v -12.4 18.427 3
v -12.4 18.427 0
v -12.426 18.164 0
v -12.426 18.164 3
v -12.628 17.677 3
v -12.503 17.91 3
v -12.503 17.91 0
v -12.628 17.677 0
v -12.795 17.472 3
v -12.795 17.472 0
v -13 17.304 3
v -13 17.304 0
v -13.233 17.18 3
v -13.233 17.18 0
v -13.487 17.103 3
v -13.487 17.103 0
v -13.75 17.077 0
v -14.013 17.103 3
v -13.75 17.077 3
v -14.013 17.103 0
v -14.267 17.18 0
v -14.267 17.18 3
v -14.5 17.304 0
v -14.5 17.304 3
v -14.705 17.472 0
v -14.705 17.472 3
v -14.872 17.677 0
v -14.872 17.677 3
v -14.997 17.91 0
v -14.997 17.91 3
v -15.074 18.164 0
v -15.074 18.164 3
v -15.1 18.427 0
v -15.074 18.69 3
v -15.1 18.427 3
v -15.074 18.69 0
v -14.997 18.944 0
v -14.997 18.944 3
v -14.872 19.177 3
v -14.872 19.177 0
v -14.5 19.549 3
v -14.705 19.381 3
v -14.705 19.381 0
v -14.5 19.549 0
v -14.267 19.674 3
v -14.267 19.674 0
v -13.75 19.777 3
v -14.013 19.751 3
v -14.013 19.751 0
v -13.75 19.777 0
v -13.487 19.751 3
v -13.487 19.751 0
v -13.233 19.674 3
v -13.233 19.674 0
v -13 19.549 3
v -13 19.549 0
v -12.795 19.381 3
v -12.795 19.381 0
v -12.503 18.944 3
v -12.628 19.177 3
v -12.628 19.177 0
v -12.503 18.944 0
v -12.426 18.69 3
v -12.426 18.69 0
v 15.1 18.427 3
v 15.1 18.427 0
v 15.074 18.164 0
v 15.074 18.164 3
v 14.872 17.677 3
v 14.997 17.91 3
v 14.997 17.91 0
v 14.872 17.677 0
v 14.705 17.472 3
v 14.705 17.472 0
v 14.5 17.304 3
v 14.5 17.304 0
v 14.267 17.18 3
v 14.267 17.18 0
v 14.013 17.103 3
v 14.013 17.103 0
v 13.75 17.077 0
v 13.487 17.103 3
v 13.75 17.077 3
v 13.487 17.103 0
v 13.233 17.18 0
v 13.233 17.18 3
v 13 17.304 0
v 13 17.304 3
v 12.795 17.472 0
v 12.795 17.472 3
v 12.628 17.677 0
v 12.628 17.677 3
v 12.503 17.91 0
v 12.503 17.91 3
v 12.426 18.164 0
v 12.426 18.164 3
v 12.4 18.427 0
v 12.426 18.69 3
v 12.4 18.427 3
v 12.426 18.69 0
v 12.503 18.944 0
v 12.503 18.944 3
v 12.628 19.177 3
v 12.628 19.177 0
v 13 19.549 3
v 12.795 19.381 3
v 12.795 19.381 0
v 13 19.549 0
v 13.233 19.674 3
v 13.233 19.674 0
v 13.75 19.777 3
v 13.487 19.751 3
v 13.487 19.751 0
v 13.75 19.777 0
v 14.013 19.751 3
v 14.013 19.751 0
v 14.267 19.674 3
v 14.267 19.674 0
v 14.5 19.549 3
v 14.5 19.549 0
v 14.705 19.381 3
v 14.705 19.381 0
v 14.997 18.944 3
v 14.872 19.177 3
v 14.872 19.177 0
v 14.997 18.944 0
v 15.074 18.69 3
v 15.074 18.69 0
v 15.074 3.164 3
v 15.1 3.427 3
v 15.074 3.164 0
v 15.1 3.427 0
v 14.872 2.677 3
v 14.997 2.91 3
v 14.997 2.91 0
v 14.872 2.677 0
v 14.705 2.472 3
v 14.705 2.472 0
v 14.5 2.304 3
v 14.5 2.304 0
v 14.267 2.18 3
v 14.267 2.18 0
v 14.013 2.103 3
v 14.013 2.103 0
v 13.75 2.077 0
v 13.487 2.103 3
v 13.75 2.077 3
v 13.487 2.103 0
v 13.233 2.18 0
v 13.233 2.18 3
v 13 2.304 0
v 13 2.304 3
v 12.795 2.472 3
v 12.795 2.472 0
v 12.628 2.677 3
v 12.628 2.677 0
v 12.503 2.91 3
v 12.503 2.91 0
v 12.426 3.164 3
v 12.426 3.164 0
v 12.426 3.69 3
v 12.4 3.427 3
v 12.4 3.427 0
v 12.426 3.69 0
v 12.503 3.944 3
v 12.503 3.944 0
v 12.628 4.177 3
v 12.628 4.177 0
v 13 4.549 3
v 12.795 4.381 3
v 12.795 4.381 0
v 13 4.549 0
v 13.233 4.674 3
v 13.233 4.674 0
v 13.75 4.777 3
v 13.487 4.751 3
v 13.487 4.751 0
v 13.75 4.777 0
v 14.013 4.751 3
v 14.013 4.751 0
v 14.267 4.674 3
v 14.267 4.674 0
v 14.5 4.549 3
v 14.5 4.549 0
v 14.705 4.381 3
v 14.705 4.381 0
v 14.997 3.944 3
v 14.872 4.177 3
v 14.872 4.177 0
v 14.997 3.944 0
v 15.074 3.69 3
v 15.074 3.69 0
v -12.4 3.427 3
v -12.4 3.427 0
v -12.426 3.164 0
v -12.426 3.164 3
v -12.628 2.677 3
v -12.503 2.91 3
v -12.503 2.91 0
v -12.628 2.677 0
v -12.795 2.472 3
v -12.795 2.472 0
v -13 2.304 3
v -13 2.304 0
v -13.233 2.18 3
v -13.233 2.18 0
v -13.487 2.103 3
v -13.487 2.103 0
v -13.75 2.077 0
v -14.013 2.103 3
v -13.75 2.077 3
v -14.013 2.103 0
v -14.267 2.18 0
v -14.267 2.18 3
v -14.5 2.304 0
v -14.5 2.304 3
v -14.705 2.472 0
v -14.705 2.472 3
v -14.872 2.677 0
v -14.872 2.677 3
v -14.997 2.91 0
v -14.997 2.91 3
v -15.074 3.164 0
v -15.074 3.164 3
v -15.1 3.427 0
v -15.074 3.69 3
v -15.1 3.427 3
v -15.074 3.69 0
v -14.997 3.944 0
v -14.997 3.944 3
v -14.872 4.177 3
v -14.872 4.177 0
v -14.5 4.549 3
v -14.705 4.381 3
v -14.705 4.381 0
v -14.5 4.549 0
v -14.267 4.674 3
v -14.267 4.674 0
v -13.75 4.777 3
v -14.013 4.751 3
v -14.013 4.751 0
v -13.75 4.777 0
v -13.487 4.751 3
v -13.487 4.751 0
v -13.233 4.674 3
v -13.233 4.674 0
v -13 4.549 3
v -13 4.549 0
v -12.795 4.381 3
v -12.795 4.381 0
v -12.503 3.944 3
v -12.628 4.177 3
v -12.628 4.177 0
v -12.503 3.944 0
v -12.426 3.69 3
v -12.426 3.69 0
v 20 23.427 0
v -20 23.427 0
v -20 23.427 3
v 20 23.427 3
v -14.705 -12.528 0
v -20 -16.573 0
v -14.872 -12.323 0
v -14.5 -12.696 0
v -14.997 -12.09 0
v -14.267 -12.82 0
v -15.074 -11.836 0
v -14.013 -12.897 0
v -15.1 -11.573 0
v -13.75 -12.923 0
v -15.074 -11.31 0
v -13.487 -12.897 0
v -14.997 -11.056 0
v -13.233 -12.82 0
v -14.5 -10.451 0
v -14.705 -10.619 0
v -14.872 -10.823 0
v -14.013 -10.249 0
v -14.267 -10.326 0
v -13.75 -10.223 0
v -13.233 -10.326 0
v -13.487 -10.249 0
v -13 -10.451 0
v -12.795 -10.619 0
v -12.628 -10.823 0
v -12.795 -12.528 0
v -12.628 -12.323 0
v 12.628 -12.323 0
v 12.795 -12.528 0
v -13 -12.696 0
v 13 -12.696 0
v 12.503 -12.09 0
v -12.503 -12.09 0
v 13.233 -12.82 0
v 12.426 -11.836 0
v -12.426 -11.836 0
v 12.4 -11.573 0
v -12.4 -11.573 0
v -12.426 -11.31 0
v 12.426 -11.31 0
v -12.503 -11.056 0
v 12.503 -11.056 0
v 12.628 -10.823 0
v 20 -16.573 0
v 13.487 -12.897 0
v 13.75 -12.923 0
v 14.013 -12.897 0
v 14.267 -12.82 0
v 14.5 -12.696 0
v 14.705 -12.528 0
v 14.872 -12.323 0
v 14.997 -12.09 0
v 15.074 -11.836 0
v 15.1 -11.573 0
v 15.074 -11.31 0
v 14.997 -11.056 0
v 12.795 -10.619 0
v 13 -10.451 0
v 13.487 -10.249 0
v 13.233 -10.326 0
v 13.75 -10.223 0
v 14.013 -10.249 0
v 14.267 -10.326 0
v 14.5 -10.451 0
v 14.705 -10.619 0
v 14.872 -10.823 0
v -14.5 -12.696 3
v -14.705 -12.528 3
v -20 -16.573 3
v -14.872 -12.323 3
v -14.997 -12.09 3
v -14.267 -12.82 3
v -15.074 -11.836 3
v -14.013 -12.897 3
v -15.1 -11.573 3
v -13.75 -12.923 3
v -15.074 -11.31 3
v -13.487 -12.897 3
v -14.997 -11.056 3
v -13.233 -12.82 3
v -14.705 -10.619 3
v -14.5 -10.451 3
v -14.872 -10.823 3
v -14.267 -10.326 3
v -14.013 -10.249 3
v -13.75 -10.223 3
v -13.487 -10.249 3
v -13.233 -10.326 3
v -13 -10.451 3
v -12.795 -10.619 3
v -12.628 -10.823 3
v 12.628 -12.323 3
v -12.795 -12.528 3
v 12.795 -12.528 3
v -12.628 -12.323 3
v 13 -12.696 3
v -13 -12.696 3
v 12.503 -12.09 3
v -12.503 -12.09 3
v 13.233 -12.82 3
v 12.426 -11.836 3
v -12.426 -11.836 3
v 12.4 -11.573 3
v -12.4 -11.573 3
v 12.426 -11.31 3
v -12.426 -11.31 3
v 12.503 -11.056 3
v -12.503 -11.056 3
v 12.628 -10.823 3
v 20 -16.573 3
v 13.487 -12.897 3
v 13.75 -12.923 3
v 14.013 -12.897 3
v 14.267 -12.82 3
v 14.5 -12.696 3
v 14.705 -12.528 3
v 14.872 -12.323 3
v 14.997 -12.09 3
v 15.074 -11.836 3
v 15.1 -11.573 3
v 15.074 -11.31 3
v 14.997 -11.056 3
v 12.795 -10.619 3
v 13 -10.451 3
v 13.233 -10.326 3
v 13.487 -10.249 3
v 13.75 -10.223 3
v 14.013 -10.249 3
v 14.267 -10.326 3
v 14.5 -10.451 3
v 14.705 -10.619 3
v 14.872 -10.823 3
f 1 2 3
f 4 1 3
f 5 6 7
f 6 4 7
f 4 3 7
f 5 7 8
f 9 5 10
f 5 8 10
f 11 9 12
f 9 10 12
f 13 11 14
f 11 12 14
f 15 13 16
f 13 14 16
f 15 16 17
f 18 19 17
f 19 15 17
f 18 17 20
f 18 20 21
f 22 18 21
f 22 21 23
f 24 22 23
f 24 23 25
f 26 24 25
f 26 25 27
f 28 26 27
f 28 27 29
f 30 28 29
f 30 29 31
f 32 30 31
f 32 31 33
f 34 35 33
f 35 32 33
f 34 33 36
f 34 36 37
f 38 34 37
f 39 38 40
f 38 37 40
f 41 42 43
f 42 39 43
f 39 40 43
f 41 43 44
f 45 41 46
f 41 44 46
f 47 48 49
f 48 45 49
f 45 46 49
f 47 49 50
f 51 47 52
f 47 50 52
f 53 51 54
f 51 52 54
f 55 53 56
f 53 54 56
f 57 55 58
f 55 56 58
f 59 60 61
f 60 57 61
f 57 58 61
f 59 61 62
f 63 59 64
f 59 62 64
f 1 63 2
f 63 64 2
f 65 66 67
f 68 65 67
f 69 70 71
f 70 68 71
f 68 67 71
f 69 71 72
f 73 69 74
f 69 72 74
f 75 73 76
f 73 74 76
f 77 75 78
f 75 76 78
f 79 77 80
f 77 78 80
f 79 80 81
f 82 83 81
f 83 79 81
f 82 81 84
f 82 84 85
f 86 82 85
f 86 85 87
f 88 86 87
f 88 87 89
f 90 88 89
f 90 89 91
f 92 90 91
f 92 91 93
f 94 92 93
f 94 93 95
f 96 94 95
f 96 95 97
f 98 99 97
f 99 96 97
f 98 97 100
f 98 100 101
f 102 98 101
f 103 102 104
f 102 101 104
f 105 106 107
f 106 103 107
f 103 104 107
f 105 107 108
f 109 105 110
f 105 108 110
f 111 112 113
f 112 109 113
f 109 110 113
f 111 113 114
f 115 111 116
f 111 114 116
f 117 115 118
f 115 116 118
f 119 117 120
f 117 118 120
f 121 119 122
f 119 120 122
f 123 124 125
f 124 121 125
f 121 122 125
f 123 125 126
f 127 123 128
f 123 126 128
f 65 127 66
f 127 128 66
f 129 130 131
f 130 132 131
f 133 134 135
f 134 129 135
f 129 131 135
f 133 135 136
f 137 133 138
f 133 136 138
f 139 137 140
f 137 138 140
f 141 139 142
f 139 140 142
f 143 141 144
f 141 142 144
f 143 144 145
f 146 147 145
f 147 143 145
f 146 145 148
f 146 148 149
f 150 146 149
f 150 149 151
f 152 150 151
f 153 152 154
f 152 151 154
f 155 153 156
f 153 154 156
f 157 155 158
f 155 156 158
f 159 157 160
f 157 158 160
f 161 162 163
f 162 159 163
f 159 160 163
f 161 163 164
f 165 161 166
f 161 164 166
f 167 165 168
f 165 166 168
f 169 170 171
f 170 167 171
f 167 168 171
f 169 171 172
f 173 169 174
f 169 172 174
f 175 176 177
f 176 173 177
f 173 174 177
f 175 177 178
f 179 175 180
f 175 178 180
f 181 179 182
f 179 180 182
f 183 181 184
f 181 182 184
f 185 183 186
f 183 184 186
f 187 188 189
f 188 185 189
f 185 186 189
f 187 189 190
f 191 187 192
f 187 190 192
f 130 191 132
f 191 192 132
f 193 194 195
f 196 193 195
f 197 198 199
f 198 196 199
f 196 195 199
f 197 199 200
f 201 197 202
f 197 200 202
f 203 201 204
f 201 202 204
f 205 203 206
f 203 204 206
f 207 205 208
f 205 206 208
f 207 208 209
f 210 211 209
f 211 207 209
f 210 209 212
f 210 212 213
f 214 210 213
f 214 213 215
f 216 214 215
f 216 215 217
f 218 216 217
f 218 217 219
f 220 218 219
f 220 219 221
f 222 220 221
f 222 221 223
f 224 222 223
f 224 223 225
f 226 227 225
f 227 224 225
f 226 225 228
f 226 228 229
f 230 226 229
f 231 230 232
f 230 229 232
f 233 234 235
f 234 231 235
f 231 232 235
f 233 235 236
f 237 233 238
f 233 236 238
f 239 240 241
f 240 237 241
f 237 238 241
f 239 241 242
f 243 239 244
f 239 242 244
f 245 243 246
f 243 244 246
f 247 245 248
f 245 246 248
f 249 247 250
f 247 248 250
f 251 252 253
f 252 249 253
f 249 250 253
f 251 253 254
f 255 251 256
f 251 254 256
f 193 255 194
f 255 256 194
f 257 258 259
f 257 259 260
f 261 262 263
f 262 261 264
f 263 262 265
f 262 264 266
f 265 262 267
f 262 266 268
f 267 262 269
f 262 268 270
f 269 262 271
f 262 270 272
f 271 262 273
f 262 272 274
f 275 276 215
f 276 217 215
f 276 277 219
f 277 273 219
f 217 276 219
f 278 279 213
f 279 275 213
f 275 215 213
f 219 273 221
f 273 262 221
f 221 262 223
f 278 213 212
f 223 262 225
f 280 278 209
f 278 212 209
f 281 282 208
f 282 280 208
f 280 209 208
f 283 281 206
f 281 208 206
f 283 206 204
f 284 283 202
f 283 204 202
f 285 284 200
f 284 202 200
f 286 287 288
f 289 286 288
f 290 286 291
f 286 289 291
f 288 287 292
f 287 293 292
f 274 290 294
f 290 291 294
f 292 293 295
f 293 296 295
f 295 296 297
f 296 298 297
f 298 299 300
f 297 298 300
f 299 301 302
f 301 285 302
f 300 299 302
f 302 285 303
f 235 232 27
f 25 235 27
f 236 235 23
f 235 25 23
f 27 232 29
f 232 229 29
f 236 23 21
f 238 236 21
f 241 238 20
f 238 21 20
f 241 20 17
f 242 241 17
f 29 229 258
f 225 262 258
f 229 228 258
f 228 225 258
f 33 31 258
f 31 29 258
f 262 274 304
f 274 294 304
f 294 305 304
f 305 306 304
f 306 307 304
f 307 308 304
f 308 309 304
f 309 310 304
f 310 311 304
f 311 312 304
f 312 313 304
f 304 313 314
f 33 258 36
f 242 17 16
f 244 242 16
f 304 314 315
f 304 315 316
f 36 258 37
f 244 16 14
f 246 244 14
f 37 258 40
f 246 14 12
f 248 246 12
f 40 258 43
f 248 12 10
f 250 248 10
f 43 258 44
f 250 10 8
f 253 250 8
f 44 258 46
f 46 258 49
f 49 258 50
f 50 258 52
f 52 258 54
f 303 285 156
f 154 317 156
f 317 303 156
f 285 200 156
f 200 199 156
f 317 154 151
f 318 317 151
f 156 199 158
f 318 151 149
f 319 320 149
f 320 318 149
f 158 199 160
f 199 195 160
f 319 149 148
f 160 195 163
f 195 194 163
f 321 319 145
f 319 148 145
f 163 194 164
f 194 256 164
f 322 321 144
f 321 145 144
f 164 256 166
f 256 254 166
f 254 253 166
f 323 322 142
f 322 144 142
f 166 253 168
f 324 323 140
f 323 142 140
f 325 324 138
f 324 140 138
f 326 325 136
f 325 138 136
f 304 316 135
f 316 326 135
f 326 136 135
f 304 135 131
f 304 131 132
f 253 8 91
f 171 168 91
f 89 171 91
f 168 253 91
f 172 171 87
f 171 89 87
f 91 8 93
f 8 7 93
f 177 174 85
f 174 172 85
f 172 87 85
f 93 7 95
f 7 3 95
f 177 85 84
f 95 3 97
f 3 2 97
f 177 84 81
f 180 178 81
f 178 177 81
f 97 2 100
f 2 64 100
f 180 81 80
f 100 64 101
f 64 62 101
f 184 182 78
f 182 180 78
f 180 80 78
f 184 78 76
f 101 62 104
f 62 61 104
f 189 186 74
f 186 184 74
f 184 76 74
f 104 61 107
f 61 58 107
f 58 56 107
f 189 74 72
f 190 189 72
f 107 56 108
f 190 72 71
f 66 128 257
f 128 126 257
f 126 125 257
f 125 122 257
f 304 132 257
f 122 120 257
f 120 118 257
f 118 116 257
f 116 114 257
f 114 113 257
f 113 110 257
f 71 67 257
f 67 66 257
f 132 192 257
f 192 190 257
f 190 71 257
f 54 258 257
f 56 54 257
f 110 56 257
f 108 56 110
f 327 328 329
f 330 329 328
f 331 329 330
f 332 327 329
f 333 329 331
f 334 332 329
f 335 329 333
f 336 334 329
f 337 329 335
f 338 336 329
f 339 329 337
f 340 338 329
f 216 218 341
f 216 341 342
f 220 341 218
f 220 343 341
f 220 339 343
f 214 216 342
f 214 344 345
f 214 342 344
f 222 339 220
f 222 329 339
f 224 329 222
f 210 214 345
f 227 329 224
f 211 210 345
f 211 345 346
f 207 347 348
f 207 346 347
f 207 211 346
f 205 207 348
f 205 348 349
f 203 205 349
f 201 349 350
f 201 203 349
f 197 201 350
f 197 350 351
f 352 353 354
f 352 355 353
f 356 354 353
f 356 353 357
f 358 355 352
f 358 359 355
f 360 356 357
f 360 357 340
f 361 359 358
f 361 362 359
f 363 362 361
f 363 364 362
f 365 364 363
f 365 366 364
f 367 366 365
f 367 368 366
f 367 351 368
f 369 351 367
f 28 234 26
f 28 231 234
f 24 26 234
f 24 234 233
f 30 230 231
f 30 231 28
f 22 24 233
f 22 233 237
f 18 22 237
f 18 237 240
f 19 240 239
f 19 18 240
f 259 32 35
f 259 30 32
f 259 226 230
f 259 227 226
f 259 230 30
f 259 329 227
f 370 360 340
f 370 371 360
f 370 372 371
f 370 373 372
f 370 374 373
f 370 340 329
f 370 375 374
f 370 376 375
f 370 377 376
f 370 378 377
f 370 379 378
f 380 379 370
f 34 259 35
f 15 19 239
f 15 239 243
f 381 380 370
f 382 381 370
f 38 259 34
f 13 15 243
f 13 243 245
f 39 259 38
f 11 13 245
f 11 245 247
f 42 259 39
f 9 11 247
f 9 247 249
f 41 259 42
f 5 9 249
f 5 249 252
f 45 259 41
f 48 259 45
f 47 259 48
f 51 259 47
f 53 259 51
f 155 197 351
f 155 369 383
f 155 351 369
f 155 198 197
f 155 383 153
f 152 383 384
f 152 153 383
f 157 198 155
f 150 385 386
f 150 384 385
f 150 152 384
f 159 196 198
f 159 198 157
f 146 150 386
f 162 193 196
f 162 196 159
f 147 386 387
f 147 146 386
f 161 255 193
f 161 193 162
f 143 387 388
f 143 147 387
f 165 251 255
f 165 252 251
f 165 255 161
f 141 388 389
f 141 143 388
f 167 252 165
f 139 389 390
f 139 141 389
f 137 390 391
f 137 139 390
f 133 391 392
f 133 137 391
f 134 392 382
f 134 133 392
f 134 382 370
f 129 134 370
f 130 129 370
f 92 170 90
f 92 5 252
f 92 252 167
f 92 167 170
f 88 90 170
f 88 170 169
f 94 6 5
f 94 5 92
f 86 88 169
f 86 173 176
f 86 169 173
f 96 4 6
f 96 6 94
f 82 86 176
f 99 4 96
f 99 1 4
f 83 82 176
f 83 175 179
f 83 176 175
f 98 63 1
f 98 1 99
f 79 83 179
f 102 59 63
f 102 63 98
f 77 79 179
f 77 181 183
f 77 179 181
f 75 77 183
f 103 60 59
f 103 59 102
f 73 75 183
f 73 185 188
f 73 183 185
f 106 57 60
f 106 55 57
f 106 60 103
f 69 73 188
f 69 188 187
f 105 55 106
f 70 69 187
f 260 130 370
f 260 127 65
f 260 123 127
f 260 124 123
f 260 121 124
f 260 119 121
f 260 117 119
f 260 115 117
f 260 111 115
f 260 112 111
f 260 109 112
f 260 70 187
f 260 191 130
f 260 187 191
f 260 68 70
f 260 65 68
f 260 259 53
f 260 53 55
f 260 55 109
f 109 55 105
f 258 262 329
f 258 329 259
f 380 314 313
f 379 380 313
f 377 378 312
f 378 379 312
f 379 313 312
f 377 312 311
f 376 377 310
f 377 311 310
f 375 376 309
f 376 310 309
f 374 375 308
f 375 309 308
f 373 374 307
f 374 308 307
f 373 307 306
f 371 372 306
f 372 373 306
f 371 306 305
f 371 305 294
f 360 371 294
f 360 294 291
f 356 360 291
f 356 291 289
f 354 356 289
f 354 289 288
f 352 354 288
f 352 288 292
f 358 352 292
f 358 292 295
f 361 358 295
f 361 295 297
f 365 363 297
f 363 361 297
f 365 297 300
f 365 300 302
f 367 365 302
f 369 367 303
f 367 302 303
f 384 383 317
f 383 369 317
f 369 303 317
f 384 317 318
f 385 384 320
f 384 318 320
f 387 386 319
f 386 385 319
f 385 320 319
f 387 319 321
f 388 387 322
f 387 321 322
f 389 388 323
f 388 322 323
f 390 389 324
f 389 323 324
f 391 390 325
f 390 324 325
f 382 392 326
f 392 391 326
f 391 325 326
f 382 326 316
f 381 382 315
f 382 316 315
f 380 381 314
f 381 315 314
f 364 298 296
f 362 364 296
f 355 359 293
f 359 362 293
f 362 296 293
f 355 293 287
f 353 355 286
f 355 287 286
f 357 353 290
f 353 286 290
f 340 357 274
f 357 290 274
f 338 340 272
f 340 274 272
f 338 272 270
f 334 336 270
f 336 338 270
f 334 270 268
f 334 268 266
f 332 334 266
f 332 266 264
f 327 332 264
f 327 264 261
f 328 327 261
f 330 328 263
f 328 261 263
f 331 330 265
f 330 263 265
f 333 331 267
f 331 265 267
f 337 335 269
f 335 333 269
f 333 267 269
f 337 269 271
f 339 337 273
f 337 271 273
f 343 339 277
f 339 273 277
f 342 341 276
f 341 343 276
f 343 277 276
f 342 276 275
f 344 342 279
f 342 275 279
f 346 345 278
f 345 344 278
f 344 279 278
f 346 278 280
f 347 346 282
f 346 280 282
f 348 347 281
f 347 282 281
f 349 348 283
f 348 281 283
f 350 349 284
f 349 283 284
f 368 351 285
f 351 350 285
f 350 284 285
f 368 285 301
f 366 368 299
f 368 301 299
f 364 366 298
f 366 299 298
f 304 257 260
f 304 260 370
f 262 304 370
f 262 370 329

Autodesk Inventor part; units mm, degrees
ref_plane "YZ Plane" through (0, 0, 0) normal (1, 0, 0) x (0, 1, 0)
ref_plane "XZ Plane" through (0, 0, 0) normal (0, 1, 0) x (-1, 0, 0)
ref_plane "XY Plane" through (0, 0, 0) normal (0, 0, 1) x (1, 0, 0)
sketch "Sketch1" plane through (0, 0, 0) normal (0, 0, 1) x (1, 0, 0)
  line L0 (7.5, 25) -> (-7.5, 25) construction
  line L1 (-7.5, 25) -> (-7.5, -25) construction
  line L2 (-7.5, -25) -> (7.5, -25) construction
  line L3 (7.5, -25) -> (7.5, 25) construction
  circle A0 centre (13.75, 3.4269) radius 1.35 projected
  circle A1 centre (-13.75, 3.4269) radius 1.35 projected
  line L4 (20, 13.4269) -> (-20, 13.4269) construction
  line L5 (-20, 13.4269) -> (-20, -6.5731) construction
  line L6 (-20, -6.5731) -> (20, -6.5731) construction
  line L7 (20, -6.5731) -> (20, 13.4269) construction
  line L8 (20, -16.5731) -> (-20, -16.5731)
  line L9 (-20, -16.5731) -> (-20, 23.4269)
  line L10 (-20, 23.4269) -> (20, 23.4269)
  line L11 (20, 23.4269) -> (20, -16.5731)
  line L12 (-20, 3.4269) -> (20, 3.4269) construction
  circle A2 centre (13.75, 18.4269) radius 1.35 projected
  circle A3 centre (-13.75, 18.4269) radius 1.35 projected
  circle A4 centre (-13.75, -11.5731) radius 1.35 projected
  circle A5 centre (13.75, -11.5731) radius 1.35 projected
  point P0 (0, 0)
  dimension "d0" = 20
  dimension "d1" = 40
extrude "Extrusion1" add sketch "Sketch1" along normal blind 3
equation "\"d1\" = 2 * d0"
